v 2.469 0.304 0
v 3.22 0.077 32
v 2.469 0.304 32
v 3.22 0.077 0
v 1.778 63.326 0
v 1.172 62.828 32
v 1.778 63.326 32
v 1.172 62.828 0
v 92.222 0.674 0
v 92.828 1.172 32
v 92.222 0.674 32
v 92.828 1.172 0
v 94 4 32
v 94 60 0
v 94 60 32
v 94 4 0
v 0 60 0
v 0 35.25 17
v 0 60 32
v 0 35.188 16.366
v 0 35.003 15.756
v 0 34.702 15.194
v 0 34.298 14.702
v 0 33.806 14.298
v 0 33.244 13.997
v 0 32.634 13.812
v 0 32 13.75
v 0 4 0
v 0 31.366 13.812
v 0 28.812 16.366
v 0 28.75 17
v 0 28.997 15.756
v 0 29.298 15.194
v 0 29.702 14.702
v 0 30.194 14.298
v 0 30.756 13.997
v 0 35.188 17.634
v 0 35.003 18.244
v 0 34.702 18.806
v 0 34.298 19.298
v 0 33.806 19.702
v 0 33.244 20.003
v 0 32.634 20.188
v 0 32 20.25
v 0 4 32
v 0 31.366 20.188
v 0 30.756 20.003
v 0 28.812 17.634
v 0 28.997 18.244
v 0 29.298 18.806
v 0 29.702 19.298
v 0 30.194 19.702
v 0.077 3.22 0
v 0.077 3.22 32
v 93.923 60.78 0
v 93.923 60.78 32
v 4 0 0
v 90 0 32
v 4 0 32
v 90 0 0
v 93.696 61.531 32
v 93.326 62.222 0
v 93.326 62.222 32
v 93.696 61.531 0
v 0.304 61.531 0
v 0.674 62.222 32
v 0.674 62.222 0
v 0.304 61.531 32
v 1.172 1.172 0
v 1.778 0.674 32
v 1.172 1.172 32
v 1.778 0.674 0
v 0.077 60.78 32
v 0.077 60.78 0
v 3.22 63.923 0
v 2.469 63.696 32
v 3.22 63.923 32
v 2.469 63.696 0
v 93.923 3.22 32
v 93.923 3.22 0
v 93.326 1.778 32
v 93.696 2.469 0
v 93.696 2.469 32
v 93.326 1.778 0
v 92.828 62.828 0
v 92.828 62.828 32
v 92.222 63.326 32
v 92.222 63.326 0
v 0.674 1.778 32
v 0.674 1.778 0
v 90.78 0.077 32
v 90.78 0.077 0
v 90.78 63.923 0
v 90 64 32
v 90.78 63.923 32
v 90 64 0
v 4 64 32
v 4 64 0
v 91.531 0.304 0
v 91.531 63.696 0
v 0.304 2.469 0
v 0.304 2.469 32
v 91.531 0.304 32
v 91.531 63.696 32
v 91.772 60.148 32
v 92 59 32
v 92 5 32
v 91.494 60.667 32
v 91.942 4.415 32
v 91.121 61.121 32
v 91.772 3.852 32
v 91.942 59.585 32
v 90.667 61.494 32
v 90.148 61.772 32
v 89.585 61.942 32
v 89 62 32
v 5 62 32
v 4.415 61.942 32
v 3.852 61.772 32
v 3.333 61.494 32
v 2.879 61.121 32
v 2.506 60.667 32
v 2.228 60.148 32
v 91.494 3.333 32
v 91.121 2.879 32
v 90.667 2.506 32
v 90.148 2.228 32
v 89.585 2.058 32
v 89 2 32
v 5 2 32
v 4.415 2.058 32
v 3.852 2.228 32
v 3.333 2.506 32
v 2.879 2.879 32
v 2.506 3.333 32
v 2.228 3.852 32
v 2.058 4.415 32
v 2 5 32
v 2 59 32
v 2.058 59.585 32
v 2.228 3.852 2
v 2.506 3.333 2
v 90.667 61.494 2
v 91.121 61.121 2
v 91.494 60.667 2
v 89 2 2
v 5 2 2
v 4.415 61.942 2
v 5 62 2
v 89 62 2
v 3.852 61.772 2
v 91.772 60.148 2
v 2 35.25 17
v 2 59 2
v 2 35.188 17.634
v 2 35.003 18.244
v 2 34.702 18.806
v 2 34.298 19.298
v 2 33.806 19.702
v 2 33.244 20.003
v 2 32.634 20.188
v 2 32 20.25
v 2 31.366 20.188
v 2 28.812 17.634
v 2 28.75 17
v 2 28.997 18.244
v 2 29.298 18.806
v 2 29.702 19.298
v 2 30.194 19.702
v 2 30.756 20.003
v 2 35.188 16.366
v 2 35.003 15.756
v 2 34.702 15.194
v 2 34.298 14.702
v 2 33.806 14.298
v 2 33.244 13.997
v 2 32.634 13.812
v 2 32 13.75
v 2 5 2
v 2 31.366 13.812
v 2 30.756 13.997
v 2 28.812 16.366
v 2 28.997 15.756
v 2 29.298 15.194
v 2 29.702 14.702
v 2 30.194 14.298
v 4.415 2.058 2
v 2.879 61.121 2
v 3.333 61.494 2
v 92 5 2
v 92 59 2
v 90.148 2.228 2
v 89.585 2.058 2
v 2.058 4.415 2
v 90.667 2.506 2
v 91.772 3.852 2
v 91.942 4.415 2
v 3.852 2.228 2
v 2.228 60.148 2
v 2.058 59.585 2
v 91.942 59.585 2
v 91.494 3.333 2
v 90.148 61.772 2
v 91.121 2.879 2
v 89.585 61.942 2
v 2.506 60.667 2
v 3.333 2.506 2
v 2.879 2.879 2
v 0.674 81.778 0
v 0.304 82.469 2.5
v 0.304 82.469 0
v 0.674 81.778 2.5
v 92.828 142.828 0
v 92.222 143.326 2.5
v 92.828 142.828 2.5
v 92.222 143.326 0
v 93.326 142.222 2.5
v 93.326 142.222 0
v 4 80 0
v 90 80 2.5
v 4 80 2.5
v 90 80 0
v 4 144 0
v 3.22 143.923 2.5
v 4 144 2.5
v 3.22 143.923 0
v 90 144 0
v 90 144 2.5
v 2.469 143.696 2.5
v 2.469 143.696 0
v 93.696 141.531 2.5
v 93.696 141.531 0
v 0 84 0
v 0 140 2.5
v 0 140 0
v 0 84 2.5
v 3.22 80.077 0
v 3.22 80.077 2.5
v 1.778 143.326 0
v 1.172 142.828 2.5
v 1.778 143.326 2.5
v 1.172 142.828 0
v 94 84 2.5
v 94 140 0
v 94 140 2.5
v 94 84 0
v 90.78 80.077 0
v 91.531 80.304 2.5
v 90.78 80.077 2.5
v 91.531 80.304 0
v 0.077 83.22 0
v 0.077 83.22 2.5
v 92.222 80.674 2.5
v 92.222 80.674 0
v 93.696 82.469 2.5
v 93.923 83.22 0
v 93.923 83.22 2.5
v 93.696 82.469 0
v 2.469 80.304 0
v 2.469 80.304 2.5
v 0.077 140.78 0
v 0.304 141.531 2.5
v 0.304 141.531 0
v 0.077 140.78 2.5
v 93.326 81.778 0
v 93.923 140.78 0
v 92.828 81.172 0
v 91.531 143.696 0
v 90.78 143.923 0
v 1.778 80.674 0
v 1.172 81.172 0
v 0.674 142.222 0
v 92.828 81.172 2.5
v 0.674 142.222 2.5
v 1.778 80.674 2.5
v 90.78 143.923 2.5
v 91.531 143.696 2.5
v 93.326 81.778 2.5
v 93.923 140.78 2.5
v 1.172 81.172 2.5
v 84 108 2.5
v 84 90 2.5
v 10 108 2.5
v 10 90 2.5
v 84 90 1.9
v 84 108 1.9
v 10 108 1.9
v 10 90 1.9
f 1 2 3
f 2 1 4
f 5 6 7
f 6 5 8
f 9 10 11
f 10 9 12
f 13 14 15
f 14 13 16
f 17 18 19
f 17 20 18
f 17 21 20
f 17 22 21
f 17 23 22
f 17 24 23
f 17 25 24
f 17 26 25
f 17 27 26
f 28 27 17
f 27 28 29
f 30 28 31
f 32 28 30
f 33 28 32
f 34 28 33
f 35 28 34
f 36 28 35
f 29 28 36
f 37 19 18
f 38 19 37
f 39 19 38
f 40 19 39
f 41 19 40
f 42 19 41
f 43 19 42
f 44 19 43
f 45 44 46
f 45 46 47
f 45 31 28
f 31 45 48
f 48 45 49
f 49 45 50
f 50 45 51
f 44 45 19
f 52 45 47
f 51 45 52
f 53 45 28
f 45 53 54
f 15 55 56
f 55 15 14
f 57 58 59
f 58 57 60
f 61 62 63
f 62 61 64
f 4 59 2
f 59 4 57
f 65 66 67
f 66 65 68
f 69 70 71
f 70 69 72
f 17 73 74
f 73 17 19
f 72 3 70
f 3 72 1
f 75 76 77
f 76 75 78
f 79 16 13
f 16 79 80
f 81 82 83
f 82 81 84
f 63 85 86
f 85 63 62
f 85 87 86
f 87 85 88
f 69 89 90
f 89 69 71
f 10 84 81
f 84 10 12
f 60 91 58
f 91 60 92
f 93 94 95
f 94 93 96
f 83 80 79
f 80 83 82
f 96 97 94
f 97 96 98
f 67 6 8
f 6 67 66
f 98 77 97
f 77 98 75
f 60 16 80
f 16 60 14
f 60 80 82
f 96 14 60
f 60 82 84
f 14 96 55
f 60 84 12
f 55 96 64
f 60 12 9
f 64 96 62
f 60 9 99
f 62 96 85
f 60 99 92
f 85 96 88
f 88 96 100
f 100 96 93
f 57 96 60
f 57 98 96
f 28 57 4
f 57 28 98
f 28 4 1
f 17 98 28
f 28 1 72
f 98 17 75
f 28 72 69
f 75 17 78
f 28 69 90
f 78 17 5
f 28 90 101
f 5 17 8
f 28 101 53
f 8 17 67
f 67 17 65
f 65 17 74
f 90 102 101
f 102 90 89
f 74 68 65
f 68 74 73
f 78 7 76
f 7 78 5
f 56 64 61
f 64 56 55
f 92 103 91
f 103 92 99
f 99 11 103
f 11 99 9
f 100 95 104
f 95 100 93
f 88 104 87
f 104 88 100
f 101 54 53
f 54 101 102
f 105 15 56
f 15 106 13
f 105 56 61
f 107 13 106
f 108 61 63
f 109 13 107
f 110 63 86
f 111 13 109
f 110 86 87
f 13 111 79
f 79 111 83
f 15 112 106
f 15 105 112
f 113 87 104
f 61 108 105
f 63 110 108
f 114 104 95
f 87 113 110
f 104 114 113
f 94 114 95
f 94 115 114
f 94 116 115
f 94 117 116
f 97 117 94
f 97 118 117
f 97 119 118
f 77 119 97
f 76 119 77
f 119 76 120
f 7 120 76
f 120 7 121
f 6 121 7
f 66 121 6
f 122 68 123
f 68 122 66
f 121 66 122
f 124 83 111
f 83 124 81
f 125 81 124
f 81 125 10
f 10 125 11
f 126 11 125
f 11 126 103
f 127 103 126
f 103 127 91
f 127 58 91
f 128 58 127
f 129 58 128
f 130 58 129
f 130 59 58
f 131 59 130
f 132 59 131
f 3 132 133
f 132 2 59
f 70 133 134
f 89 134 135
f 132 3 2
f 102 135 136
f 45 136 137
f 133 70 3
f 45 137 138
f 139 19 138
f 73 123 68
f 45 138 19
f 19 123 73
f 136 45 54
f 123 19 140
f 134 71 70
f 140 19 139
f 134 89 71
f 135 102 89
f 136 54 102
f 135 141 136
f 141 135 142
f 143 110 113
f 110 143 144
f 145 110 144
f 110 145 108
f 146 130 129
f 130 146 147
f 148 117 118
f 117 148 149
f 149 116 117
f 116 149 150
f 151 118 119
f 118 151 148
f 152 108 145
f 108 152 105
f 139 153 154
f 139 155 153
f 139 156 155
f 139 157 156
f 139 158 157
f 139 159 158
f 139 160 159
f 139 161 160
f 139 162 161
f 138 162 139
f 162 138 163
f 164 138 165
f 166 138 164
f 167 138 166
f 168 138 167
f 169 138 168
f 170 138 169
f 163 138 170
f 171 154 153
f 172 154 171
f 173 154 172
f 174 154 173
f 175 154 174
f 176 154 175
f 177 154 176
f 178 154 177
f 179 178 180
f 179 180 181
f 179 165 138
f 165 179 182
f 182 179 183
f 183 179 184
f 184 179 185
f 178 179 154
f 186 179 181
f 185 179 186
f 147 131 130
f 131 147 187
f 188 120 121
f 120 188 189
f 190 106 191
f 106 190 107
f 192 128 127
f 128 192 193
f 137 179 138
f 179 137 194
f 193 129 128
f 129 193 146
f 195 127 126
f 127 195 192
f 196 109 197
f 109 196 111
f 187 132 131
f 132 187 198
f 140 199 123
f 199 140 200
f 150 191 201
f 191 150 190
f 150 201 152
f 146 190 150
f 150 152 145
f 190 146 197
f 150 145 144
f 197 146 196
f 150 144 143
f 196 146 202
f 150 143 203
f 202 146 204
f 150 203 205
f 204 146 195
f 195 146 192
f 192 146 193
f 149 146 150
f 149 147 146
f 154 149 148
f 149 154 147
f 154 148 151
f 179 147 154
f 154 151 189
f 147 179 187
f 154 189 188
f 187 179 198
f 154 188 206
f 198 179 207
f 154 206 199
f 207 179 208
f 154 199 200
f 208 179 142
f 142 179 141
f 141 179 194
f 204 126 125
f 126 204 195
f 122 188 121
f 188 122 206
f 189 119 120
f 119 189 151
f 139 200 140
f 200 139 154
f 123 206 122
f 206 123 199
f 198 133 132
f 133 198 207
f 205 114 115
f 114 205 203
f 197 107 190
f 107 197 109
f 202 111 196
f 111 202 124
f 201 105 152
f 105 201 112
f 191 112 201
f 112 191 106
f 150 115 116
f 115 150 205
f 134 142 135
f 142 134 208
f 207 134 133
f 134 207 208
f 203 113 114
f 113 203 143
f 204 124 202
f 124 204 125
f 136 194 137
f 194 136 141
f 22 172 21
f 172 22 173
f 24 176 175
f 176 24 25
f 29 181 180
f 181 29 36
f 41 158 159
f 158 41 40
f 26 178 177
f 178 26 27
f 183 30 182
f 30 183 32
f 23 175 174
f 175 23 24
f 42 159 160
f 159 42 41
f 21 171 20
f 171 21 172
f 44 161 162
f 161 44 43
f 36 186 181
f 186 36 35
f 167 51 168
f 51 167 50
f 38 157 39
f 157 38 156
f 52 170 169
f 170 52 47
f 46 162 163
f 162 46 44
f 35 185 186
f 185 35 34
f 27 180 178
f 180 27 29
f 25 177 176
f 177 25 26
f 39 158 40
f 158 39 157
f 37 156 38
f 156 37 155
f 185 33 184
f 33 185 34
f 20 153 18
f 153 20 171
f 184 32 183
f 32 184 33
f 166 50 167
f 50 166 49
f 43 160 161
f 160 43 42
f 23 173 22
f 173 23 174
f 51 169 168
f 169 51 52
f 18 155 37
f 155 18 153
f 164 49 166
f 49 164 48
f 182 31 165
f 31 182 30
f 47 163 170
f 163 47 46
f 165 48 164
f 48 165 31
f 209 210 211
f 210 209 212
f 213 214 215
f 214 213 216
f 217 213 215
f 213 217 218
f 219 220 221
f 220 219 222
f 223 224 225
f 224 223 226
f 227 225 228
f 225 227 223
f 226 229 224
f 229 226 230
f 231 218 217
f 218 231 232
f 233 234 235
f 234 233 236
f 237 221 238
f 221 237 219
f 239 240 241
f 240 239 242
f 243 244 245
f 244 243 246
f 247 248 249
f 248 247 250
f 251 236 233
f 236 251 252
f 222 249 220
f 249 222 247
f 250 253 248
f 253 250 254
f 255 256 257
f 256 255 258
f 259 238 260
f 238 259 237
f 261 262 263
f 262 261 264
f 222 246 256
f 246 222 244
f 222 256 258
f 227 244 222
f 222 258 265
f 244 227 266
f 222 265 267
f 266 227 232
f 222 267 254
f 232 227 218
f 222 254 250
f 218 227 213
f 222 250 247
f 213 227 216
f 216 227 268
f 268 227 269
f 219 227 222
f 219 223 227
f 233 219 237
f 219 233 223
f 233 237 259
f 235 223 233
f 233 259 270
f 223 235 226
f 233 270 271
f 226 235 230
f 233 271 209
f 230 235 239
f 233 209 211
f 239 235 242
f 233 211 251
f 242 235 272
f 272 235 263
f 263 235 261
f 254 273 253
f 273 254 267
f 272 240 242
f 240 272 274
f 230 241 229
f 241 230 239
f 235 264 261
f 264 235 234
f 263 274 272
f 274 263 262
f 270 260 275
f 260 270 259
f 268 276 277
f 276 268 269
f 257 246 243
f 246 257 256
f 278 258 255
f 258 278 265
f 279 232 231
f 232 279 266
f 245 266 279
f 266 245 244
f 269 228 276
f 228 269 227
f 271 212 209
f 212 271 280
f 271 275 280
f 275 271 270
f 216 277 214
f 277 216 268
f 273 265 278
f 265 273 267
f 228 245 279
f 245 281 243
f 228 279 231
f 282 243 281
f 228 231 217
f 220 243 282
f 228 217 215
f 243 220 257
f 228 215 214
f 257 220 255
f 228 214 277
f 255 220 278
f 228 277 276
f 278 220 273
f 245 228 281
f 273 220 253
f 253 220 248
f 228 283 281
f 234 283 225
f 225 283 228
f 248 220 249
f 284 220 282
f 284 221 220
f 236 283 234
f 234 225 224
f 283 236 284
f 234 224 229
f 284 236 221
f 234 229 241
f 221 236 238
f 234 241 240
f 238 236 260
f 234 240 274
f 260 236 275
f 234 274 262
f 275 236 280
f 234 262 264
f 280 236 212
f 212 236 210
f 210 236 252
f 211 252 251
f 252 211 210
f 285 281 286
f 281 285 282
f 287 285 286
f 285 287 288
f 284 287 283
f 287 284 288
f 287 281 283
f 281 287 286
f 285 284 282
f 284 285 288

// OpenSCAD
// ODC-ENC — parametric enclosure for ODC-REC-RPI-1A
// OpenSCAD — MIT with OpenDashCAN repo
// Units: mm

inner_l = 90;
inner_w = 60;
inner_h = 30;
wall = 2.0;
lid_h = 2.5;
corner_r = 4;
cable_od = 6.5; // OBD pigtail gland hole

module rounded_box(l, w, h, r) {
  hull() {
    for (x = [r, l - r])
      for (y = [r, w - r])
        translate([x, y, 0])
          cylinder(h = h, r = r, $fn = 32);
  }
}

module shell() {
  difference() {
    rounded_box(inner_l + 2 * wall, inner_w + 2 * wall, inner_h + wall, corner_r);
    translate([wall, wall, wall])
      rounded_box(inner_l, inner_w, inner_h + 1, corner_r - 1);
    // cable exit
    translate([-1, (inner_w + 2 * wall) / 2, wall + inner_h / 2])
      rotate([0, 90, 0])
        cylinder(h = wall + 2, d = cable_od, $fn = 32);
  }
}

module lid() {
  difference() {
    rounded_box(inner_l + 2 * wall, inner_w + 2 * wall, lid_h, corner_r);
    // label recess
    translate([wall + 8, wall + 8, lid_h - 0.6])
      cube([inner_l - 16, 18, 1]);
  }
}

shell();
translate([0, inner_w + 20, 0]) lid();
